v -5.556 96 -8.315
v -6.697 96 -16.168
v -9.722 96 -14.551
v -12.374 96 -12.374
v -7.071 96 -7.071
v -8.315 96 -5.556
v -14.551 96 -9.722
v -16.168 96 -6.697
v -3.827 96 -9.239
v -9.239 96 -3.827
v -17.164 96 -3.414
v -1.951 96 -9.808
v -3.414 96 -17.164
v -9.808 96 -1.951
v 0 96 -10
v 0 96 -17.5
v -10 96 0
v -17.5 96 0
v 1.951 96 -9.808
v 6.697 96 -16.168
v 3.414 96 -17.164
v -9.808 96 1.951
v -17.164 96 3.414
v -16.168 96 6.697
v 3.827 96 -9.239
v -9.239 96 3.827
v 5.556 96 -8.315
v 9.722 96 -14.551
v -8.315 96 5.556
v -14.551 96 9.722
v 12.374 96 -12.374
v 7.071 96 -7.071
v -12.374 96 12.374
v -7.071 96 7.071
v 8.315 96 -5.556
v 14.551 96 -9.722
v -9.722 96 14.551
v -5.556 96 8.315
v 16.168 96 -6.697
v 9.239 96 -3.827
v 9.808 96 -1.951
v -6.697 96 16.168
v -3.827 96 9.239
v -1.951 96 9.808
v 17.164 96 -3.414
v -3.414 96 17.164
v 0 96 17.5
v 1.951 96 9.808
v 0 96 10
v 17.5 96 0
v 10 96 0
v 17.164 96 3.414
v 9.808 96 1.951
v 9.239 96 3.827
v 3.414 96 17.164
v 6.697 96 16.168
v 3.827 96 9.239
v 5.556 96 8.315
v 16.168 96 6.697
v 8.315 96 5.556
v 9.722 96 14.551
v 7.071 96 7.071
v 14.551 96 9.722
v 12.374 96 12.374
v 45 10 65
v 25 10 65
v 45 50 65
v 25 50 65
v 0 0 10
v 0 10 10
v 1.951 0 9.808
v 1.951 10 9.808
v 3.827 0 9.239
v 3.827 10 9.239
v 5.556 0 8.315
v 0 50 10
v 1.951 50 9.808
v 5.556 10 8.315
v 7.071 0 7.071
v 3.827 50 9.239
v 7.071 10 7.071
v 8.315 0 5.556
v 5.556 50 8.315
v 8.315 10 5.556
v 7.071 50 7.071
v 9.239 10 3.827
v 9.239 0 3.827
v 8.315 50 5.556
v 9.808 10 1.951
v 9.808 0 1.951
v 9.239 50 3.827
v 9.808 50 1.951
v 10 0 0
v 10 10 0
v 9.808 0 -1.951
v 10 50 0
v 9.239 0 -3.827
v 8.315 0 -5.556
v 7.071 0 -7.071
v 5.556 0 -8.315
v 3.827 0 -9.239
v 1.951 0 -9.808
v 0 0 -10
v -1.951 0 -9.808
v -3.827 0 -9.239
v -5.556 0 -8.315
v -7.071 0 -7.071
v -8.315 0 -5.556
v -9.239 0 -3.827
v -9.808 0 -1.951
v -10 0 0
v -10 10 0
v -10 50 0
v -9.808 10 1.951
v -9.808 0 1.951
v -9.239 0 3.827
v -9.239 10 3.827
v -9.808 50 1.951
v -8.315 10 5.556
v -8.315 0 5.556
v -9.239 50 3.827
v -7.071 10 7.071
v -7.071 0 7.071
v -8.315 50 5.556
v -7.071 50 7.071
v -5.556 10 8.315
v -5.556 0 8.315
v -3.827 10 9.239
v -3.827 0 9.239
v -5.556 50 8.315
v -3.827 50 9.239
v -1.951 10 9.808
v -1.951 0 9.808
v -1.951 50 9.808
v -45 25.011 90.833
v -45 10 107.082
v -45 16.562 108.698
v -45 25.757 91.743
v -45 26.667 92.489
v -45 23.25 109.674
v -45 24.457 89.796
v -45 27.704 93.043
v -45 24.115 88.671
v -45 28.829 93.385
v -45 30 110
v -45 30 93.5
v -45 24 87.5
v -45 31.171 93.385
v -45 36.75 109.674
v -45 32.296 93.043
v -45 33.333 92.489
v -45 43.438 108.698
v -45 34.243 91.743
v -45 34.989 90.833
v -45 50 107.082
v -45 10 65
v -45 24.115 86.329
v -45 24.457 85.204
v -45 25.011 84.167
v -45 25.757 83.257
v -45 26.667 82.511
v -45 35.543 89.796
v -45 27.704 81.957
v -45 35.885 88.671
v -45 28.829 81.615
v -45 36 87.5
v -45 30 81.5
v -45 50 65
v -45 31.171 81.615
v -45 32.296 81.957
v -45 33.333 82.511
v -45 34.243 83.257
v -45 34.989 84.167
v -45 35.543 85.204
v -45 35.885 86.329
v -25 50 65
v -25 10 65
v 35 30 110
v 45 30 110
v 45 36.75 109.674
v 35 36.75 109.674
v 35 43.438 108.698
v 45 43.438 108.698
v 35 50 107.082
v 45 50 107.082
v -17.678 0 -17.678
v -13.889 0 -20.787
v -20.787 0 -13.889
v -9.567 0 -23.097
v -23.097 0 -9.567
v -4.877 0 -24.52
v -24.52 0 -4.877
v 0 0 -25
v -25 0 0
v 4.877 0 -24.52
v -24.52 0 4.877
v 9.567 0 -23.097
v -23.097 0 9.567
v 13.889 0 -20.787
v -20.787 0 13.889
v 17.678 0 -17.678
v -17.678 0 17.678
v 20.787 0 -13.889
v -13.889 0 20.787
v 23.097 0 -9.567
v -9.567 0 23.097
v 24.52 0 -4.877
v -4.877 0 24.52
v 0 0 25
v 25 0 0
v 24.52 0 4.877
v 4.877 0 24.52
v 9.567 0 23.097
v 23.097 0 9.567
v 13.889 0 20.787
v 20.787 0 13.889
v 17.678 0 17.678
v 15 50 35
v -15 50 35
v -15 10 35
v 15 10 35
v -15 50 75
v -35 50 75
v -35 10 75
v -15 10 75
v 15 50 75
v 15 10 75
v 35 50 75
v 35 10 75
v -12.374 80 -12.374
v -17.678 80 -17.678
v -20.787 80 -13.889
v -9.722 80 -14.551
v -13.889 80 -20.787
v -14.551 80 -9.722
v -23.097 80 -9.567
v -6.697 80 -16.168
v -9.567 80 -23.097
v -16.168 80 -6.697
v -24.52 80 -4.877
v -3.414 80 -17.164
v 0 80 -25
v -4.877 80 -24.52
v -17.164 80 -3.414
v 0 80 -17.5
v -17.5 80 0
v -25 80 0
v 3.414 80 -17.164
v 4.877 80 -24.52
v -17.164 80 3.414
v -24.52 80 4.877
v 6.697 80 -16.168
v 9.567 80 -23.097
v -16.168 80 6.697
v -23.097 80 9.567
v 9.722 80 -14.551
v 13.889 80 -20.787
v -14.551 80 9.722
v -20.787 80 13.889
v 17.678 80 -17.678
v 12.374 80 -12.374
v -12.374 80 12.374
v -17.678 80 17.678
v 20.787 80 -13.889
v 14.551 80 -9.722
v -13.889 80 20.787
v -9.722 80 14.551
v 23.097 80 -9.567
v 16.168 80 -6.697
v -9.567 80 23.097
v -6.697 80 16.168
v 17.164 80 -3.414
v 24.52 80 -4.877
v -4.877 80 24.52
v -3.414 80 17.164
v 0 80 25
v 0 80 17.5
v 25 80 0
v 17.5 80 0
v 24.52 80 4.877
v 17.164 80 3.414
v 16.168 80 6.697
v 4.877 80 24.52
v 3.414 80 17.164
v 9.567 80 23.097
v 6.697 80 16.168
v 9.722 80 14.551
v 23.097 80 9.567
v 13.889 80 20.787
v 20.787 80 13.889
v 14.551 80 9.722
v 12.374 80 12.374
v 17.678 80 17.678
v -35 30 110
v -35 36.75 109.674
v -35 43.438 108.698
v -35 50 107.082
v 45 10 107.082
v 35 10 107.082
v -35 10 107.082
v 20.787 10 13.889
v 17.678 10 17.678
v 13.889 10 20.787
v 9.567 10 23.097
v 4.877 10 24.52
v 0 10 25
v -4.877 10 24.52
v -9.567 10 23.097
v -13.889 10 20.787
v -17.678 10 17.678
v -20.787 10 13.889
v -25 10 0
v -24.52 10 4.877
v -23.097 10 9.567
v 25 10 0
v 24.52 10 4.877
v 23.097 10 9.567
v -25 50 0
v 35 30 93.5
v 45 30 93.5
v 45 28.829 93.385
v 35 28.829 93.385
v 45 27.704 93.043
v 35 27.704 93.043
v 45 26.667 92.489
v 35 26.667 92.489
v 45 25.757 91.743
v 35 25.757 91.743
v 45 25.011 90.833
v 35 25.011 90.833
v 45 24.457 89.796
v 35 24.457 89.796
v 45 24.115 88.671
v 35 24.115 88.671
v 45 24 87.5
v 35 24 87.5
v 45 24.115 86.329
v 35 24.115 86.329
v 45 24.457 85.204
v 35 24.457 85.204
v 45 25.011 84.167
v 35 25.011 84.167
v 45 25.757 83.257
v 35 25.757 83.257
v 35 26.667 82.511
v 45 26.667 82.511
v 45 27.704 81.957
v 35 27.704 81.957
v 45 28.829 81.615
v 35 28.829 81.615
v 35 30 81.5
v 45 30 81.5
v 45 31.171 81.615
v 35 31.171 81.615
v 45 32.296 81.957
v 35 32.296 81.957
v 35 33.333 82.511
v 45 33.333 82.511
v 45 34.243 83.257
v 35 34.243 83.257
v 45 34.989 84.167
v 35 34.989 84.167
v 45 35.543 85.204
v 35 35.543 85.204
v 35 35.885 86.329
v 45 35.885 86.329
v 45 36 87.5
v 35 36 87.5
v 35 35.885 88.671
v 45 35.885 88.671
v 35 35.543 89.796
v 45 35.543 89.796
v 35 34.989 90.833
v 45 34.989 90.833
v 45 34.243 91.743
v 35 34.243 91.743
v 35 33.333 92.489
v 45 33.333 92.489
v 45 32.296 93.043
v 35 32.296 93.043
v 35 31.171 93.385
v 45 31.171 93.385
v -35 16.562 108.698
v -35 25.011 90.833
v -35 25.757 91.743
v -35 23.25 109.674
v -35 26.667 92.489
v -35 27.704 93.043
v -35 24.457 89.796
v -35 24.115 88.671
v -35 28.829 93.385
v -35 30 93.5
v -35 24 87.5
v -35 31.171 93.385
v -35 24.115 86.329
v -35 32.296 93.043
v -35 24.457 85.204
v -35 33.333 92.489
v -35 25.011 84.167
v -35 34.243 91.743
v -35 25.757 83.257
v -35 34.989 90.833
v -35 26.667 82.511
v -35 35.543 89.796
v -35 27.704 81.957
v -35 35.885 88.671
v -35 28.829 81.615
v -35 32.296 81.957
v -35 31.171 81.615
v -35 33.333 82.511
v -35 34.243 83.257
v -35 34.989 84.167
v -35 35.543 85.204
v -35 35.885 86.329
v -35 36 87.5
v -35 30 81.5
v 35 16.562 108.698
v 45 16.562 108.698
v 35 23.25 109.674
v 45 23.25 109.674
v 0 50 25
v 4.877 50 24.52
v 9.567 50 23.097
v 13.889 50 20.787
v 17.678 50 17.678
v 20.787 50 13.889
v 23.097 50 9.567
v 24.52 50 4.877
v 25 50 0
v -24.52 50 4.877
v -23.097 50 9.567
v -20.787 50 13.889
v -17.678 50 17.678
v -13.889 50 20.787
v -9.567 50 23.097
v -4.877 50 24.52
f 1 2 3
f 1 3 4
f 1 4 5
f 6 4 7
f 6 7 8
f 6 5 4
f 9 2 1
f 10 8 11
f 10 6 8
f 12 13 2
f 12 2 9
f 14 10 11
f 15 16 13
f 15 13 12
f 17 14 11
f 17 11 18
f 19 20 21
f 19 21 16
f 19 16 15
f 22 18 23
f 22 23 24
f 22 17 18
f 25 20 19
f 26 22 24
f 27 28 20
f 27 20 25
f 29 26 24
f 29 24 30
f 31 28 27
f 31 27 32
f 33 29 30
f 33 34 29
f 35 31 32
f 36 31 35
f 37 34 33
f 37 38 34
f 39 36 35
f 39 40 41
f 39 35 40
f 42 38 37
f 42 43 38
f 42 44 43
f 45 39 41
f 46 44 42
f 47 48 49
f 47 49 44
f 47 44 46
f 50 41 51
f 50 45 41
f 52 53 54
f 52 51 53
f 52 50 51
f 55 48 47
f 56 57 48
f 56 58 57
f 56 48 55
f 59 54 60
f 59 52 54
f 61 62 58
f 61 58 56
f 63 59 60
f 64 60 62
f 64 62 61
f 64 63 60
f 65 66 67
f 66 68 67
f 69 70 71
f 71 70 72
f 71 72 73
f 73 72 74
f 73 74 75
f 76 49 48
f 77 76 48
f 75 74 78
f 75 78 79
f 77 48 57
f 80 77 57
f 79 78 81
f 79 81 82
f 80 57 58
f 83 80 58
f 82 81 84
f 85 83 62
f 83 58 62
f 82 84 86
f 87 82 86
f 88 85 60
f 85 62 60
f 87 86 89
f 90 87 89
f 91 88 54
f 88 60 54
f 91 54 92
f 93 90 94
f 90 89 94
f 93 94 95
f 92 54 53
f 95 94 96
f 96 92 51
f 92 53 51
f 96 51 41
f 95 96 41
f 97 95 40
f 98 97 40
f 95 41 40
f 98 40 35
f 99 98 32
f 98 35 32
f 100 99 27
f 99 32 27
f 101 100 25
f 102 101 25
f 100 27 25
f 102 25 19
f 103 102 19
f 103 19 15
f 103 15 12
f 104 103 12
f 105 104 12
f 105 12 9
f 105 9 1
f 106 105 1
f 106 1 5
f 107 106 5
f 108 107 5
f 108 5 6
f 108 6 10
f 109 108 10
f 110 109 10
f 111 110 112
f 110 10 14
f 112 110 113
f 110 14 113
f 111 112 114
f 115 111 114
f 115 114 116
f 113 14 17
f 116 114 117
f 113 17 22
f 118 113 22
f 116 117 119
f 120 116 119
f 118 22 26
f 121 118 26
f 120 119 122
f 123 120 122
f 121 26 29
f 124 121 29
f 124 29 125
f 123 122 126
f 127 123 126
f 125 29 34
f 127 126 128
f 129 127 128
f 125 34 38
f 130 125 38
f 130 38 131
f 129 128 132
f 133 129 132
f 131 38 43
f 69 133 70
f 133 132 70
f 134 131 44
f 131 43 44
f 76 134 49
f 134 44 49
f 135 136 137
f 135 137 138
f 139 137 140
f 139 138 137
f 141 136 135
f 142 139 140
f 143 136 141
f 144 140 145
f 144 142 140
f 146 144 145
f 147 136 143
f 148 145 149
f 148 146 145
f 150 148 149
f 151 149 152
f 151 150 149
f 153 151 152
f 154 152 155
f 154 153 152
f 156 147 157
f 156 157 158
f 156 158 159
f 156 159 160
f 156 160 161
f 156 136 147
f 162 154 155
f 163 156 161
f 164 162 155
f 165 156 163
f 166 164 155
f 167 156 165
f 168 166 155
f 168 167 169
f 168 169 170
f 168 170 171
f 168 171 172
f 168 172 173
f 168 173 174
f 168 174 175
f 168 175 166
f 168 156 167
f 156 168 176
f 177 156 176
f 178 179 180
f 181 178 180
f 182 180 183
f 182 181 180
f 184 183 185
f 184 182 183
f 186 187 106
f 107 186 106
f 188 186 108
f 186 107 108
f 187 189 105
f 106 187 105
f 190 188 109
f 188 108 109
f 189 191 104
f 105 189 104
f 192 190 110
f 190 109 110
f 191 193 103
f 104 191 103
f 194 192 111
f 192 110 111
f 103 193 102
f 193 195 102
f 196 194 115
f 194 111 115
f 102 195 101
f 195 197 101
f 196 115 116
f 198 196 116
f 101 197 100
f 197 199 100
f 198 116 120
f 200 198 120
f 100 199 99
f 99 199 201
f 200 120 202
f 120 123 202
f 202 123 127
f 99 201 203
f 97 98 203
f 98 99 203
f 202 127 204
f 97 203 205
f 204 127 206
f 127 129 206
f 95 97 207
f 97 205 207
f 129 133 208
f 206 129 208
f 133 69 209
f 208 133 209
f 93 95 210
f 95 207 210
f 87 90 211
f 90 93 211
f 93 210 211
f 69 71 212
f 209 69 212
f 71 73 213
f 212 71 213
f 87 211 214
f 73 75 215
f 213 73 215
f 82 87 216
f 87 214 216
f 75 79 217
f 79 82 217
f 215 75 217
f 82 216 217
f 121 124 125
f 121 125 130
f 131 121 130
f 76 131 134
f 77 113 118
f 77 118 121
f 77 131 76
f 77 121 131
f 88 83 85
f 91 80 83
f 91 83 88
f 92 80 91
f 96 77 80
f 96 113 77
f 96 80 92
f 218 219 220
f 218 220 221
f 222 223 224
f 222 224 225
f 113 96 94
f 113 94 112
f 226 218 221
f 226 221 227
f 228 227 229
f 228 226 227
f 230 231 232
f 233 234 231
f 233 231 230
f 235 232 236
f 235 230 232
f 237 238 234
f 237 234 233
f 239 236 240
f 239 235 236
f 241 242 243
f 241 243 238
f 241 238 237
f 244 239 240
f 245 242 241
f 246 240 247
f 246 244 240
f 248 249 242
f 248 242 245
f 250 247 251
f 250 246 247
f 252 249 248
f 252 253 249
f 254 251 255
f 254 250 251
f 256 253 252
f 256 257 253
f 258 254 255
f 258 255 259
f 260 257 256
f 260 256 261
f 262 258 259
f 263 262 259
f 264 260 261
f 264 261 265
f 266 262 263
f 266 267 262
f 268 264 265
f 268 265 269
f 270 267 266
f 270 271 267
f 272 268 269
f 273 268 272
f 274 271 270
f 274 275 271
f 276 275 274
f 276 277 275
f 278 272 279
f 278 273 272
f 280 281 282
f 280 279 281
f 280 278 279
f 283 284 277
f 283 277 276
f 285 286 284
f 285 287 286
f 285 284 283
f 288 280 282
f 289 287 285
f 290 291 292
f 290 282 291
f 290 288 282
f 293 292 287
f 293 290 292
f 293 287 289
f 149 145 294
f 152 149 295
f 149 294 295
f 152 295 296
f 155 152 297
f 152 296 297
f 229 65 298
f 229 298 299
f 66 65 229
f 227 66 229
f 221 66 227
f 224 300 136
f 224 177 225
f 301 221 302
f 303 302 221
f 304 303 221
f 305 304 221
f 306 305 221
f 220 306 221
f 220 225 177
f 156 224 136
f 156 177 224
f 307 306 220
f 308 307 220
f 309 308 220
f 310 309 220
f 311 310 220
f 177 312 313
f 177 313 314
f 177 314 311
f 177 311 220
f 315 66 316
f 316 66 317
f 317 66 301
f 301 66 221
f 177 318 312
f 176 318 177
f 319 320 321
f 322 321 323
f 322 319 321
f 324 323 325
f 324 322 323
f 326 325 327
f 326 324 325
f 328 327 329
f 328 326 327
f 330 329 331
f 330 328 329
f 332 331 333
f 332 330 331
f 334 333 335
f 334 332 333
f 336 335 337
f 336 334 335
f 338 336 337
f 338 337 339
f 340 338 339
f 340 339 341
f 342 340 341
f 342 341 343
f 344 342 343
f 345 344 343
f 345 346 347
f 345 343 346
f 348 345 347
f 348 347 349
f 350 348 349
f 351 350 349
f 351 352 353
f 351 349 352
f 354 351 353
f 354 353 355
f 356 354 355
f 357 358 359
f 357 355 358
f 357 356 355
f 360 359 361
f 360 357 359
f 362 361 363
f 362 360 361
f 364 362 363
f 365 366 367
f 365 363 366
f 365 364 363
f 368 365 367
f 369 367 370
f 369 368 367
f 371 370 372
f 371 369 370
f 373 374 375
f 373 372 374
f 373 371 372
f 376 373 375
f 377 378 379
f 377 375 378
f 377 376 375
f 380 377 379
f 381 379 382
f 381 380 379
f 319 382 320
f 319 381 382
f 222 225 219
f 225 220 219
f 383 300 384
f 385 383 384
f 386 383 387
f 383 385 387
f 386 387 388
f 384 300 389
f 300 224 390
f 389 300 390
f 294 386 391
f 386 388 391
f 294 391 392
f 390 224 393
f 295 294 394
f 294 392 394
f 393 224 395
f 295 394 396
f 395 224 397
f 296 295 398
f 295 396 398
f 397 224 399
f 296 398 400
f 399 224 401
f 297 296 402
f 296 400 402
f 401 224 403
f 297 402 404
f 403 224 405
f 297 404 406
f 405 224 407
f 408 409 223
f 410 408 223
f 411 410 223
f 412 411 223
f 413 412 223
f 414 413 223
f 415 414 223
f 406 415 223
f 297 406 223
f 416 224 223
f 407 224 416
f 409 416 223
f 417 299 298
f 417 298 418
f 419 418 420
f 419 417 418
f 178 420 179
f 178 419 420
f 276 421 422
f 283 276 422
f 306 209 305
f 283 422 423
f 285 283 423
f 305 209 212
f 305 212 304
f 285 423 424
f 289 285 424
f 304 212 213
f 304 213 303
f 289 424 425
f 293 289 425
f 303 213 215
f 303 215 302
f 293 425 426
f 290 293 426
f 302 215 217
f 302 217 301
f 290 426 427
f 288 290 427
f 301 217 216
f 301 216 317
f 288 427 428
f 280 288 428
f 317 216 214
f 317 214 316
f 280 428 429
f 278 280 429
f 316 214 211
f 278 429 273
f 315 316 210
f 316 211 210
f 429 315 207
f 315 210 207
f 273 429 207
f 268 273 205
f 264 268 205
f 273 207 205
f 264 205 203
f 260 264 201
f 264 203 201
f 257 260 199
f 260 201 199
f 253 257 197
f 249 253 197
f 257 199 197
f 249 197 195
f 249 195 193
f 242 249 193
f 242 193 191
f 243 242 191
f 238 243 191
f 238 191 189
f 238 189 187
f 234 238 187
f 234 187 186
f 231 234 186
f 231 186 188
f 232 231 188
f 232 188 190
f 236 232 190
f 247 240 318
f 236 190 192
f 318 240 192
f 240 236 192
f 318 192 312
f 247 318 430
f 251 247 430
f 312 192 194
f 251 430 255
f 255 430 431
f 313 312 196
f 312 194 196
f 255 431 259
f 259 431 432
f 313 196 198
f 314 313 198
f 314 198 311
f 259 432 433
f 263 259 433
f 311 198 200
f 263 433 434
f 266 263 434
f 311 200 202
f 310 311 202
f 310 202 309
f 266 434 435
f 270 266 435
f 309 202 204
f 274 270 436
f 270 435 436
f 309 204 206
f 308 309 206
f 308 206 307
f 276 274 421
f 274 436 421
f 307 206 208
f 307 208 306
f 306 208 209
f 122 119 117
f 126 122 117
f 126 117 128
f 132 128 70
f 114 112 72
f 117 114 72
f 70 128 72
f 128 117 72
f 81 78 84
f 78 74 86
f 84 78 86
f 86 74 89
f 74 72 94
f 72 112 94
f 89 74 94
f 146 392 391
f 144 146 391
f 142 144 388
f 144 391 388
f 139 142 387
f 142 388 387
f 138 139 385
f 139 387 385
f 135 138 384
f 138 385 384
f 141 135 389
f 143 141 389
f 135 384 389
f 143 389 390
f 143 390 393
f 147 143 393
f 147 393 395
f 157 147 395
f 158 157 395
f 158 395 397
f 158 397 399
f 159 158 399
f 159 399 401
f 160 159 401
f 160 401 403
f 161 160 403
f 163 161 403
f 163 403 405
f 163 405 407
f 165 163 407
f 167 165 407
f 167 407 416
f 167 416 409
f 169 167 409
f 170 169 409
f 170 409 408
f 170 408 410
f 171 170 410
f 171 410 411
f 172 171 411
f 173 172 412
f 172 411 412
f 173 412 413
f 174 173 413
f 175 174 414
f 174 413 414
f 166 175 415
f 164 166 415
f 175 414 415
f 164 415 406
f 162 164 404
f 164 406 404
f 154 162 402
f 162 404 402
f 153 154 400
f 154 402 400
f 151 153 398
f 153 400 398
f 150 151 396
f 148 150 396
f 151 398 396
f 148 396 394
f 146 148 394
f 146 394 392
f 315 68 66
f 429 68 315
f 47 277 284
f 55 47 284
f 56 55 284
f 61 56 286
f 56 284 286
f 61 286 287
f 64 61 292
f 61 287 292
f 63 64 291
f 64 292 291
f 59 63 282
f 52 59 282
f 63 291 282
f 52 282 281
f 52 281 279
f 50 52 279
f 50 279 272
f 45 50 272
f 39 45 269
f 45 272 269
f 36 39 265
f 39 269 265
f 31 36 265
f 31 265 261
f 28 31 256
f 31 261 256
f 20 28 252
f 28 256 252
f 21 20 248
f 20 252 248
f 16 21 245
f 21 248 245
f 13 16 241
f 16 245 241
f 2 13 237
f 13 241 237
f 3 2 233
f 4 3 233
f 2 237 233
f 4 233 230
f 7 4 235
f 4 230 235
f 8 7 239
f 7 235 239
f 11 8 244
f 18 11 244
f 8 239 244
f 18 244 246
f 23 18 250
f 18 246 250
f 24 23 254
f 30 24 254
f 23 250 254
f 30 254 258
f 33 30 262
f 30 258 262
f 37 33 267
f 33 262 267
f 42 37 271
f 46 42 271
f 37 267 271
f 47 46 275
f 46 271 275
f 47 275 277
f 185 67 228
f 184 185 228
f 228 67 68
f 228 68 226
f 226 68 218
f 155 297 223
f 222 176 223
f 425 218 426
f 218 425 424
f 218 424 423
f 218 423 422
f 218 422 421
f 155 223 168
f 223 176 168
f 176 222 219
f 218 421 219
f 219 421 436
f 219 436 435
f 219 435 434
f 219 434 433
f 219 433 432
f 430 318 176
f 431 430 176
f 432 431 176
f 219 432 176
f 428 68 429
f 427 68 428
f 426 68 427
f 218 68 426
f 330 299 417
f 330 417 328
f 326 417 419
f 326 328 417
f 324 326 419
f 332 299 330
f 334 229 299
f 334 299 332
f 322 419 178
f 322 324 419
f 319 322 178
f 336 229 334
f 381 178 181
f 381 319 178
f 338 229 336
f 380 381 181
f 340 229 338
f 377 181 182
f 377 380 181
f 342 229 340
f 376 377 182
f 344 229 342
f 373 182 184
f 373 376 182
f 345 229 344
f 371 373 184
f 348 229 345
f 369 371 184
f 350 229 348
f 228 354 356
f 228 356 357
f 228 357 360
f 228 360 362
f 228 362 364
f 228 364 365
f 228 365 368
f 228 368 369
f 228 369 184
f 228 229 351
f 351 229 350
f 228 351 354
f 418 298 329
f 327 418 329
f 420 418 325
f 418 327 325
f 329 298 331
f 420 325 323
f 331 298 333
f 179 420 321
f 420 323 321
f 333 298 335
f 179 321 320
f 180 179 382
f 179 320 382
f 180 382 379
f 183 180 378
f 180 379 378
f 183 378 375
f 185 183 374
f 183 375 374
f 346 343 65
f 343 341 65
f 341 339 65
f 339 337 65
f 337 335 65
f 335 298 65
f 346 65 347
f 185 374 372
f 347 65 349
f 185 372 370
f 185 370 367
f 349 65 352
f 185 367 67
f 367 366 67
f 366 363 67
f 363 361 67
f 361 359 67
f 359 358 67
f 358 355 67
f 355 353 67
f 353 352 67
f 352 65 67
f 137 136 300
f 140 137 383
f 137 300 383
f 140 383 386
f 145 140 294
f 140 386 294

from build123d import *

# Parameters (mm, degrees)
SKETCH1_R           = 25
BOSS_EXTRUDE1_DEPTH = 80
SKETCH2_R           = 17.5
BOSS_EXTRUDE2_DEPTH = 16
SKETCH3_R           = 10
CUT_EXTRUDE1_DEPTH  = 144
BOSS_EXTRUDE3_DEPTH = 40
SKETCH5_W           = 30
SKETCH5_H           = 40
SKETCH5_W_2         = 20
SKETCH5_W_3         = 10
BOSS_EXTRUDE4_DEPTH = 10
SKETCH6_W           = 10
SKETCH6_H           = 40
BOSS_EXTRUDE5_DEPTH = 35
CUT_EXTRUDE2_DEPTH  = 35


with BuildPart() as part:
    # Sketch1 → Boss-Extrude1 (new body)
    with BuildSketch(Plane(origin=(0, 0, 0), x_dir=(1, 0, 0), z_dir=(0, 1, 0))):
        with Locations(Location((0, 0, 0), (0, 0, 270))):
            Circle(SKETCH1_R)
    extrude(amount=BOSS_EXTRUDE1_DEPTH)

    # Sketch2 → Boss-Extrude2 (add)
    with BuildSketch(Plane(origin=(0, 80, 0), x_dir=(1, 0, 0), z_dir=(0, 1, 0))):
        with Locations(Location((0, 0, 0), (0, 0, 270))):
            Circle(SKETCH2_R)
    extrude(amount=BOSS_EXTRUDE2_DEPTH)

    # Sketch3 → Cut-Extrude1 (cut)
    with BuildSketch(Plane(origin=(0, 96, 0), x_dir=(1, 0, 0), z_dir=(0, 1, 0))):
        with Locations(Location((0, 0, 0), (0, 0, 270))):
            Circle(SKETCH3_R)
    extrude(amount=-CUT_EXTRUDE1_DEPTH, mode=Mode.SUBTRACT)

    # Sketch4 → Boss-Extrude3 (add)
    with BuildSketch(Plane(origin=(0, 50, 0), x_dir=(1, 0, 0), z_dir=(0, 1, 0))):
        Polygon((0, -35), (0, 0), (-25, 0), (-25, -65), (-15, -65), (-15, -35), align=None)
        Polygon((25, 0), (0, 0), (0, -35), (15, -35), (15, -65), (25, -65), align=None)
    extrude(amount=-BOSS_EXTRUDE3_DEPTH)

    # Sketch5 → Boss-Extrude4 (add)
    with BuildSketch(Plane.XY.offset(65)):
        with Locations((-30, 30)):
            Rectangle(SKETCH5_W, SKETCH5_H)
        with Locations((35, 30)):
            Rectangle(SKETCH5_W_2, SKETCH5_H)
        with Locations((20, 30)):
            Rectangle(SKETCH5_W_3, SKETCH5_H)
    extrude(amount=BOSS_EXTRUDE4_DEPTH)

    # Sketch6 → Boss-Extrude5 (add)
    with BuildSketch(Plane.XY.offset(75)):
        with Locations((-40, 30)):
            Rectangle(SKETCH6_W, SKETCH6_H)
    boss_extrude5 = extrude(amount=BOSS_EXTRUDE5_DEPTH)

    # Sketch7 → Cut-Extrude2 (cut)
    with BuildSketch(Plane(origin=(-35, 0, 0), x_dir=(0, 0, -1), z_dir=(1, 0, 0))):
        with BuildLine():
            Line((-107.082039325, 50), (-110, 50))
            Line((-110, 50), (-110, 30))
            ThreePointArc((-110, 30), (-109.266668581, 40.10587075), (-107.082039325, 50))
        make_face()
        with BuildLine():
            ThreePointArc((-107.082039325, 10), (-109.266668581, 19.89412925), (-110, 30))
            Line((-110, 30), (-110, 10))
            Line((-110, 10), (-107.082039325, 10))
        make_face()
        with BuildLine():
            ThreePointArc((-81.5, 30), (-87.5, 36), (-93.5, 30))
            Line((-93.5, 30), (-87.5, 30))
            Line((-87.5, 30), (-81.5, 30))
        make_face()
        with BuildLine():
            Line((-87.5, 30), (-93.5, 30))
            ThreePointArc((-93.5, 30), (-87.5, 24), (-81.5, 30))
            Line((-81.5, 30), (-87.5, 30))
        make_face()
    cut_extrude2 = extrude(amount=-CUT_EXTRUDE2_DEPTH, mode=Mode.SUBTRACT)

    # Mirror1: Boss-Extrude5, Cut-Extrude2 across plane
    add(boss_extrude5.mirror(Plane(origin=(0, 0, 0), x_dir=(0, 0, 1), z_dir=(1, 0, 0))))
    add(cut_extrude2.mirror(Plane(origin=(0, 0, 0), x_dir=(0, 0, 1), z_dir=(1, 0, 0))), mode=Mode.SUBTRACT)


solid = part.part
